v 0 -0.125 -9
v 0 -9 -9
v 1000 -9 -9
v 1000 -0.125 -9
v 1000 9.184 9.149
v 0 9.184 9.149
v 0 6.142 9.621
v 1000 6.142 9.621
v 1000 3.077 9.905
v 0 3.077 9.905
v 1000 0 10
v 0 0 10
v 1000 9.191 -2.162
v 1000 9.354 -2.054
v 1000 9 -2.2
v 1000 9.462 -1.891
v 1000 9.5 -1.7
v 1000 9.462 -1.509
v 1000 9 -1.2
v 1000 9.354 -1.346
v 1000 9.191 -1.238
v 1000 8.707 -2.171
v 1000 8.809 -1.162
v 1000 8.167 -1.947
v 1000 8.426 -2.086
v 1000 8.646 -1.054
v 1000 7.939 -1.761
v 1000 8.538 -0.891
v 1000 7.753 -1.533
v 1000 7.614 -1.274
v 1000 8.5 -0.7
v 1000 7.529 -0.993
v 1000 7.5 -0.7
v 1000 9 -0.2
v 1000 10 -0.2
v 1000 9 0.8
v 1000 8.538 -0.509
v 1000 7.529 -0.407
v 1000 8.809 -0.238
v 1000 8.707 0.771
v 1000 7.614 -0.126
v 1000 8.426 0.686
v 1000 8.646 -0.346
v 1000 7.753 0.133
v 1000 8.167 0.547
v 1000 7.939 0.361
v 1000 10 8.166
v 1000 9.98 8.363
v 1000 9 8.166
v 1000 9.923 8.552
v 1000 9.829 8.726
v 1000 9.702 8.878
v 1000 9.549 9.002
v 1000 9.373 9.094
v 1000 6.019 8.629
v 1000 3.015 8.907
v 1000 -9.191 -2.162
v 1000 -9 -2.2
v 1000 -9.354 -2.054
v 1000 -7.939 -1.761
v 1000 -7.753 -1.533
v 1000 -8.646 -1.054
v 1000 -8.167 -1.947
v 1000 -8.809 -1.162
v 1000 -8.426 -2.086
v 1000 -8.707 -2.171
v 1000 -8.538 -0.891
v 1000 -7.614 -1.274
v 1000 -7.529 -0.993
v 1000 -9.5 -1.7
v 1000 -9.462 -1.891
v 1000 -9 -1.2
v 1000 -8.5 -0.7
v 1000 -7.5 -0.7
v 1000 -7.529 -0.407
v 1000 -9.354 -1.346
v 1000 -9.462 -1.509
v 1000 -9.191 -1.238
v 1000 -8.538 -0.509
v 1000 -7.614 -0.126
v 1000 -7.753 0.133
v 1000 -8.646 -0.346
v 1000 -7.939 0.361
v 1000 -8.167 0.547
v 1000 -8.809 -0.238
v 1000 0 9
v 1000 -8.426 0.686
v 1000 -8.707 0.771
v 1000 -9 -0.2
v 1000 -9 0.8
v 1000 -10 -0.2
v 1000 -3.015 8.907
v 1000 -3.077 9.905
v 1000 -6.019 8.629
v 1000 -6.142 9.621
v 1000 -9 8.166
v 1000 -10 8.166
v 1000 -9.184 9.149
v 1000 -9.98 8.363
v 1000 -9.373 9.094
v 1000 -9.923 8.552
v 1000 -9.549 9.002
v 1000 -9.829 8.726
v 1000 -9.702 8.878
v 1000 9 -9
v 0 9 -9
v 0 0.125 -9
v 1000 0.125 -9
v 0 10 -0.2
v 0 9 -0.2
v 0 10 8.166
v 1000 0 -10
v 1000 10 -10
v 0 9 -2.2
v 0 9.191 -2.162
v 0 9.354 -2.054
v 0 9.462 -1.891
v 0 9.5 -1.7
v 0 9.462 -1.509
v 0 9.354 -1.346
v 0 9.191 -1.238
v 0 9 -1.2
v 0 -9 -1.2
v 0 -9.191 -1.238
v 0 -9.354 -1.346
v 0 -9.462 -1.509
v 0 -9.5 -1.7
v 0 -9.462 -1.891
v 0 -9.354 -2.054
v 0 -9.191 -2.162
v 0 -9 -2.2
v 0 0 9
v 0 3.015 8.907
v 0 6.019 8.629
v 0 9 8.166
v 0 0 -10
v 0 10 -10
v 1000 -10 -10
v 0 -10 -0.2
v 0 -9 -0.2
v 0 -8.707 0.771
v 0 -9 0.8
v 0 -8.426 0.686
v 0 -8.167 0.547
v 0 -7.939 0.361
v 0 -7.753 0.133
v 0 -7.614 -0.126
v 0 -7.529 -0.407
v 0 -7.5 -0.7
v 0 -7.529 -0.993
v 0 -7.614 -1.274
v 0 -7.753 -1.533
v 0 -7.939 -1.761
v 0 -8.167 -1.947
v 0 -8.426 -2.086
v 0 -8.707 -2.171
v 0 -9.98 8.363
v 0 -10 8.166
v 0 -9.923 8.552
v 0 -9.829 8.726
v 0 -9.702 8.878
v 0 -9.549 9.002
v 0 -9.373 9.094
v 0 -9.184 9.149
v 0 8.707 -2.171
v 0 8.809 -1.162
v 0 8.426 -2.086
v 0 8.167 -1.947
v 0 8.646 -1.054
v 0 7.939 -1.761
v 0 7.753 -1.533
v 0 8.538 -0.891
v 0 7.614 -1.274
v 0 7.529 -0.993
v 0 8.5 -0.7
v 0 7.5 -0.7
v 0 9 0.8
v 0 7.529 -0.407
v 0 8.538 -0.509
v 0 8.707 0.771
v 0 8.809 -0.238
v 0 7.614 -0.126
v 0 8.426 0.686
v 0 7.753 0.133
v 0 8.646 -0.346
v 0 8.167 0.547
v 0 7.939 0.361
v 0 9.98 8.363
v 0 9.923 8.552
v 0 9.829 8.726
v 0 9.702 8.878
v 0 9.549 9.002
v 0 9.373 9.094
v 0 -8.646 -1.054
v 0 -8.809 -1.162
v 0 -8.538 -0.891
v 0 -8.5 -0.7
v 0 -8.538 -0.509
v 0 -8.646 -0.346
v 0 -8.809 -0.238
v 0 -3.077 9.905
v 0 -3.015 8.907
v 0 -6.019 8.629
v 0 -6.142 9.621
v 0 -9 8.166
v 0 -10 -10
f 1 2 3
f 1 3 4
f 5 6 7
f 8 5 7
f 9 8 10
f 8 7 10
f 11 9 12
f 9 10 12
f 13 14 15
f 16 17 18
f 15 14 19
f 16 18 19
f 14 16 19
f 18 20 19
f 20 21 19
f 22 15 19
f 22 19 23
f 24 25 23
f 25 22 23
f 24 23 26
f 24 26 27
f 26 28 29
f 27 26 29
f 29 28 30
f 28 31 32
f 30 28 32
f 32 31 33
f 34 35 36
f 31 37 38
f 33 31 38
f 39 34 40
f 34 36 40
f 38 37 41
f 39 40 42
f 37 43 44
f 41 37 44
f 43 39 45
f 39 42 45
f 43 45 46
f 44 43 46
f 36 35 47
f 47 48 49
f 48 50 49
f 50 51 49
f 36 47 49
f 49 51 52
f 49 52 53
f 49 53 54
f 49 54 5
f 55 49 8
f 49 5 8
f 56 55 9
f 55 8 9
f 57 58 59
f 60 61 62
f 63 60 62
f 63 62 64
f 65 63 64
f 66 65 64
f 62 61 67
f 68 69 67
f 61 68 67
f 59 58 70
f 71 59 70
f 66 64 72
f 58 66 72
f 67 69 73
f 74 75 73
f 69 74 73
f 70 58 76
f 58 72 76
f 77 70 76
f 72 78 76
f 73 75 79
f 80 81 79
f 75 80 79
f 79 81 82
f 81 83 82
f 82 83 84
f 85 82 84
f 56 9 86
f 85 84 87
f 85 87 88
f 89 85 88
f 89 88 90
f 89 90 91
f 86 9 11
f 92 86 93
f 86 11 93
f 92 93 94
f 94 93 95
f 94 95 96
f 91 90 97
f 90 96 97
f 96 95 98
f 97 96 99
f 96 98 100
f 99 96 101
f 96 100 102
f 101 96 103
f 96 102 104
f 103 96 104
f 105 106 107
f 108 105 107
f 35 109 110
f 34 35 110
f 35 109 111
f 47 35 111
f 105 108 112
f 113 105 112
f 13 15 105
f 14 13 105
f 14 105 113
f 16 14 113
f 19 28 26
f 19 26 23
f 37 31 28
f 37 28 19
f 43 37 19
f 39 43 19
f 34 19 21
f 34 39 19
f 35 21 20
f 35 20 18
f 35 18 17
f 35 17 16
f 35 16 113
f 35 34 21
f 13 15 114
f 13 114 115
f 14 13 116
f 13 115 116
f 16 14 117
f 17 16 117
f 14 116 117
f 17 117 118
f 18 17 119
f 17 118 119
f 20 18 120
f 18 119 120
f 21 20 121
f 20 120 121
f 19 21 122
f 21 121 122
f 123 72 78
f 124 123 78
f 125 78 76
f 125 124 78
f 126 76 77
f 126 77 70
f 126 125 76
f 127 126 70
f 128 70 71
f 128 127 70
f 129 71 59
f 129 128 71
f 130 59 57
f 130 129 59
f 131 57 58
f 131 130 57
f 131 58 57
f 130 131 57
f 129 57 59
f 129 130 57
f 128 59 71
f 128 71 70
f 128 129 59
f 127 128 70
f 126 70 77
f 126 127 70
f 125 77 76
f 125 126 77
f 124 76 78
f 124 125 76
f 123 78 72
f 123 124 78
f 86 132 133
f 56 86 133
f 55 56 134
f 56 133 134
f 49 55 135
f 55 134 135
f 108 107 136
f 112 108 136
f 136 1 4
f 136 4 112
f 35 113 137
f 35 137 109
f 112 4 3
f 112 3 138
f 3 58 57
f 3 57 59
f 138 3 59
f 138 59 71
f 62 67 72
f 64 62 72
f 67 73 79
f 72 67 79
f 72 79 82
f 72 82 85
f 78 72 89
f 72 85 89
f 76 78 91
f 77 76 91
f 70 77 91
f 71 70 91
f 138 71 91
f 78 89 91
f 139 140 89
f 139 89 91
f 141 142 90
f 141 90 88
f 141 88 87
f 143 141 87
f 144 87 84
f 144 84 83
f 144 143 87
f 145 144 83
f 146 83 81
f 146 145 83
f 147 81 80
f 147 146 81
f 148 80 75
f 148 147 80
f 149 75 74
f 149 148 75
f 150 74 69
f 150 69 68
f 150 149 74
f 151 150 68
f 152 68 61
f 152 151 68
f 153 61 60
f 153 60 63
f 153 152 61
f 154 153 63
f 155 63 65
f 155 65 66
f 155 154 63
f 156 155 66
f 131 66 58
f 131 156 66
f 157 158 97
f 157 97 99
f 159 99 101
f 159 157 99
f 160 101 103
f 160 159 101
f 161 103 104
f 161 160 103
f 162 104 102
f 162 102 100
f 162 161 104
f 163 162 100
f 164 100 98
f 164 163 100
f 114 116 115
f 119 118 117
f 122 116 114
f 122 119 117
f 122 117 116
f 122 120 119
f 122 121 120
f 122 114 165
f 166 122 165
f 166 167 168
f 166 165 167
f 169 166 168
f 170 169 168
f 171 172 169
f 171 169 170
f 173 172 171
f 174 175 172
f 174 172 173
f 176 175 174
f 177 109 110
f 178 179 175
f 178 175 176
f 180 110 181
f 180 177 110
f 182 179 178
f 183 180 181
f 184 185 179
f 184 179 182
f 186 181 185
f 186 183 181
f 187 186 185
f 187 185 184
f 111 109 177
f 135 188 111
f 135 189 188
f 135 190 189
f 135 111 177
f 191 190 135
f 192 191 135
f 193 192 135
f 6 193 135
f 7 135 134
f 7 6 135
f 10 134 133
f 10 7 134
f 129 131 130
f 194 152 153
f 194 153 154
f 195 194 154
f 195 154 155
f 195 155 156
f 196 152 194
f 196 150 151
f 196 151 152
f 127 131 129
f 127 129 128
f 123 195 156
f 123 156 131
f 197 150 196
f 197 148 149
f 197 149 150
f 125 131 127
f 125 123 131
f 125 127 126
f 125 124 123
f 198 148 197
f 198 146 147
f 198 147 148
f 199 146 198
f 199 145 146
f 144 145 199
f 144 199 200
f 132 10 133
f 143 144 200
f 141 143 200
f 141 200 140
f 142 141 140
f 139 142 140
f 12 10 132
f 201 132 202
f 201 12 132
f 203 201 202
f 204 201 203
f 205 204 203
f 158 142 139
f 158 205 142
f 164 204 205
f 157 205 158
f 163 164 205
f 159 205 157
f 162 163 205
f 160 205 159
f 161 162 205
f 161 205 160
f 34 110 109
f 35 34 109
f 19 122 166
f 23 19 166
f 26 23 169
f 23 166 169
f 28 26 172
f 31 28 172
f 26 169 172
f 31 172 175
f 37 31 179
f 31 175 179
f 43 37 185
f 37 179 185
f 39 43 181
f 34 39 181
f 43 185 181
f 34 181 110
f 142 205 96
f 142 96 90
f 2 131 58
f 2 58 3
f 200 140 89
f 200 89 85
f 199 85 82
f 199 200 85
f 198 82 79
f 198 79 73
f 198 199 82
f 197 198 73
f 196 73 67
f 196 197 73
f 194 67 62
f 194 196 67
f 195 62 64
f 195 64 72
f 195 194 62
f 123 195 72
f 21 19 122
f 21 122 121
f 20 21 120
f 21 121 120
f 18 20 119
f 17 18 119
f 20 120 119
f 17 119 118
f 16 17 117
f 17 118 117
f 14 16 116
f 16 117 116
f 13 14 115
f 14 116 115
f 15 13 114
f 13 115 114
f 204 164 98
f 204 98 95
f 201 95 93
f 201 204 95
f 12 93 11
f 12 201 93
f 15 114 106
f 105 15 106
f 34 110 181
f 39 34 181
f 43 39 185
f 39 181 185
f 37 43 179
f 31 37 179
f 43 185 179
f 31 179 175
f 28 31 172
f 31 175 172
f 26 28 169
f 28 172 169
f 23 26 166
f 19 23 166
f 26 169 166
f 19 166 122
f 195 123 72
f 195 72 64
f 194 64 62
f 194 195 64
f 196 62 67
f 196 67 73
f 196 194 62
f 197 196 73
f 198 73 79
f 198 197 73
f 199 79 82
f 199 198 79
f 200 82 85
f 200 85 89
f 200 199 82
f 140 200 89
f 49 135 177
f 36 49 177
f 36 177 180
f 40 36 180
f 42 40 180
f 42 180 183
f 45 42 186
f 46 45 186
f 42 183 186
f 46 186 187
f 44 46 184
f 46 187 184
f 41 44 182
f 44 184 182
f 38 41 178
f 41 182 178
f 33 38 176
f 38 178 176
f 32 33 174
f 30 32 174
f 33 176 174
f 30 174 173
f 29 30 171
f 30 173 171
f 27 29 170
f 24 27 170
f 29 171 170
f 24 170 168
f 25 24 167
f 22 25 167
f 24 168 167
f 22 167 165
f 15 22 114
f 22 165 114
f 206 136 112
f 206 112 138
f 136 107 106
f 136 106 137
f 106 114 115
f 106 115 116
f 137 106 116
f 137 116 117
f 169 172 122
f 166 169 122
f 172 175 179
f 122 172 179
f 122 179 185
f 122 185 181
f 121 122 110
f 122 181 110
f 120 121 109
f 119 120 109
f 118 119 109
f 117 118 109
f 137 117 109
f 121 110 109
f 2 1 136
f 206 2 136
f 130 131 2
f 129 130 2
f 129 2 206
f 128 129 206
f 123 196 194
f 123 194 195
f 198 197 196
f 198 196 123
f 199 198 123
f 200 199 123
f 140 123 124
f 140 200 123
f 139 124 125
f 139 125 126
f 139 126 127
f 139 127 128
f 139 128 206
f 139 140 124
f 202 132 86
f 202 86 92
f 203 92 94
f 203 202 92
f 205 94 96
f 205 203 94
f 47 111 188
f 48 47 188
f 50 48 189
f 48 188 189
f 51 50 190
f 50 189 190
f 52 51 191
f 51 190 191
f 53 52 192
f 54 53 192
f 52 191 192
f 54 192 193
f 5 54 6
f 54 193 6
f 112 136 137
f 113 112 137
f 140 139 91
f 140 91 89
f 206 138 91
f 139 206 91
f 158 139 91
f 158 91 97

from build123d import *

# Parameters (mm, degrees)
F2_DEPTH = 1000
F4_DEPTH = 1000


with BuildPart() as f2:
    # F1 (on Right) → F2 (new body)
    with BuildSketch(Plane.YZ):
        with BuildLine():
            Line((0.125, -9), (0, -10))
            Line((0, -10), (10, -10))
            Line((10, -10), (10, -0.2))
            Line((10, -0.2), (9, -0.2))
            ThreePointArc((9, -0.2), (8.5, -0.7), (9, -1.2))
            ThreePointArc((9, -1.2), (9.5, -1.7), (9, -2.2))
            Line((9, -2.2), (9, -9))
            Line((9, -9), (0.125, -9))
        make_face()
    extrude(amount=F2_DEPTH)


with BuildPart() as f4:
    # F3 (on Right) → F4 (new body)
    with BuildSketch(Plane.YZ):
        with BuildLine():
            Line((9, -0.2), (10, -0.2))
            Line((10, -0.2), (10, 8.1663783152))
            ThreePointArc((10, 8.1663783152), (9.7693092582, 8.8052548802), (9.1836734694, 9.1493656277))
            ThreePointArc((9.1836734694, 9.1493656277), (4.6114920912, 9.7868872364), (0, 10))
            Line((0, 10), (0, 9))
            ThreePointArc((0, 9), (4.5192622493, 8.7911494917), (9, 8.1663783152))
            Line((9, 8.1663783152), (9, 0.8))
            ThreePointArc((9, 0.8), (7.5, -0.7), (9, -2.2))
            ThreePointArc((9, -2.2), (9.5, -1.7), (9, -1.2))
            ThreePointArc((9, -1.2), (8.5, -0.7), (9, -0.2))
        make_face()
    extrude(amount=F4_DEPTH)

    # F6: F4 across plane


with BuildPart() as f5_1:
    # F5: instance of F2
    add(f2.part.mirror(Plane.XZ))


with BuildPart() as f4_1:
    add(f4.part)
    add(f4.part.mirror(Plane.XZ))


solid = Compound([f2.part, f5_1.part, f4_1.part])
